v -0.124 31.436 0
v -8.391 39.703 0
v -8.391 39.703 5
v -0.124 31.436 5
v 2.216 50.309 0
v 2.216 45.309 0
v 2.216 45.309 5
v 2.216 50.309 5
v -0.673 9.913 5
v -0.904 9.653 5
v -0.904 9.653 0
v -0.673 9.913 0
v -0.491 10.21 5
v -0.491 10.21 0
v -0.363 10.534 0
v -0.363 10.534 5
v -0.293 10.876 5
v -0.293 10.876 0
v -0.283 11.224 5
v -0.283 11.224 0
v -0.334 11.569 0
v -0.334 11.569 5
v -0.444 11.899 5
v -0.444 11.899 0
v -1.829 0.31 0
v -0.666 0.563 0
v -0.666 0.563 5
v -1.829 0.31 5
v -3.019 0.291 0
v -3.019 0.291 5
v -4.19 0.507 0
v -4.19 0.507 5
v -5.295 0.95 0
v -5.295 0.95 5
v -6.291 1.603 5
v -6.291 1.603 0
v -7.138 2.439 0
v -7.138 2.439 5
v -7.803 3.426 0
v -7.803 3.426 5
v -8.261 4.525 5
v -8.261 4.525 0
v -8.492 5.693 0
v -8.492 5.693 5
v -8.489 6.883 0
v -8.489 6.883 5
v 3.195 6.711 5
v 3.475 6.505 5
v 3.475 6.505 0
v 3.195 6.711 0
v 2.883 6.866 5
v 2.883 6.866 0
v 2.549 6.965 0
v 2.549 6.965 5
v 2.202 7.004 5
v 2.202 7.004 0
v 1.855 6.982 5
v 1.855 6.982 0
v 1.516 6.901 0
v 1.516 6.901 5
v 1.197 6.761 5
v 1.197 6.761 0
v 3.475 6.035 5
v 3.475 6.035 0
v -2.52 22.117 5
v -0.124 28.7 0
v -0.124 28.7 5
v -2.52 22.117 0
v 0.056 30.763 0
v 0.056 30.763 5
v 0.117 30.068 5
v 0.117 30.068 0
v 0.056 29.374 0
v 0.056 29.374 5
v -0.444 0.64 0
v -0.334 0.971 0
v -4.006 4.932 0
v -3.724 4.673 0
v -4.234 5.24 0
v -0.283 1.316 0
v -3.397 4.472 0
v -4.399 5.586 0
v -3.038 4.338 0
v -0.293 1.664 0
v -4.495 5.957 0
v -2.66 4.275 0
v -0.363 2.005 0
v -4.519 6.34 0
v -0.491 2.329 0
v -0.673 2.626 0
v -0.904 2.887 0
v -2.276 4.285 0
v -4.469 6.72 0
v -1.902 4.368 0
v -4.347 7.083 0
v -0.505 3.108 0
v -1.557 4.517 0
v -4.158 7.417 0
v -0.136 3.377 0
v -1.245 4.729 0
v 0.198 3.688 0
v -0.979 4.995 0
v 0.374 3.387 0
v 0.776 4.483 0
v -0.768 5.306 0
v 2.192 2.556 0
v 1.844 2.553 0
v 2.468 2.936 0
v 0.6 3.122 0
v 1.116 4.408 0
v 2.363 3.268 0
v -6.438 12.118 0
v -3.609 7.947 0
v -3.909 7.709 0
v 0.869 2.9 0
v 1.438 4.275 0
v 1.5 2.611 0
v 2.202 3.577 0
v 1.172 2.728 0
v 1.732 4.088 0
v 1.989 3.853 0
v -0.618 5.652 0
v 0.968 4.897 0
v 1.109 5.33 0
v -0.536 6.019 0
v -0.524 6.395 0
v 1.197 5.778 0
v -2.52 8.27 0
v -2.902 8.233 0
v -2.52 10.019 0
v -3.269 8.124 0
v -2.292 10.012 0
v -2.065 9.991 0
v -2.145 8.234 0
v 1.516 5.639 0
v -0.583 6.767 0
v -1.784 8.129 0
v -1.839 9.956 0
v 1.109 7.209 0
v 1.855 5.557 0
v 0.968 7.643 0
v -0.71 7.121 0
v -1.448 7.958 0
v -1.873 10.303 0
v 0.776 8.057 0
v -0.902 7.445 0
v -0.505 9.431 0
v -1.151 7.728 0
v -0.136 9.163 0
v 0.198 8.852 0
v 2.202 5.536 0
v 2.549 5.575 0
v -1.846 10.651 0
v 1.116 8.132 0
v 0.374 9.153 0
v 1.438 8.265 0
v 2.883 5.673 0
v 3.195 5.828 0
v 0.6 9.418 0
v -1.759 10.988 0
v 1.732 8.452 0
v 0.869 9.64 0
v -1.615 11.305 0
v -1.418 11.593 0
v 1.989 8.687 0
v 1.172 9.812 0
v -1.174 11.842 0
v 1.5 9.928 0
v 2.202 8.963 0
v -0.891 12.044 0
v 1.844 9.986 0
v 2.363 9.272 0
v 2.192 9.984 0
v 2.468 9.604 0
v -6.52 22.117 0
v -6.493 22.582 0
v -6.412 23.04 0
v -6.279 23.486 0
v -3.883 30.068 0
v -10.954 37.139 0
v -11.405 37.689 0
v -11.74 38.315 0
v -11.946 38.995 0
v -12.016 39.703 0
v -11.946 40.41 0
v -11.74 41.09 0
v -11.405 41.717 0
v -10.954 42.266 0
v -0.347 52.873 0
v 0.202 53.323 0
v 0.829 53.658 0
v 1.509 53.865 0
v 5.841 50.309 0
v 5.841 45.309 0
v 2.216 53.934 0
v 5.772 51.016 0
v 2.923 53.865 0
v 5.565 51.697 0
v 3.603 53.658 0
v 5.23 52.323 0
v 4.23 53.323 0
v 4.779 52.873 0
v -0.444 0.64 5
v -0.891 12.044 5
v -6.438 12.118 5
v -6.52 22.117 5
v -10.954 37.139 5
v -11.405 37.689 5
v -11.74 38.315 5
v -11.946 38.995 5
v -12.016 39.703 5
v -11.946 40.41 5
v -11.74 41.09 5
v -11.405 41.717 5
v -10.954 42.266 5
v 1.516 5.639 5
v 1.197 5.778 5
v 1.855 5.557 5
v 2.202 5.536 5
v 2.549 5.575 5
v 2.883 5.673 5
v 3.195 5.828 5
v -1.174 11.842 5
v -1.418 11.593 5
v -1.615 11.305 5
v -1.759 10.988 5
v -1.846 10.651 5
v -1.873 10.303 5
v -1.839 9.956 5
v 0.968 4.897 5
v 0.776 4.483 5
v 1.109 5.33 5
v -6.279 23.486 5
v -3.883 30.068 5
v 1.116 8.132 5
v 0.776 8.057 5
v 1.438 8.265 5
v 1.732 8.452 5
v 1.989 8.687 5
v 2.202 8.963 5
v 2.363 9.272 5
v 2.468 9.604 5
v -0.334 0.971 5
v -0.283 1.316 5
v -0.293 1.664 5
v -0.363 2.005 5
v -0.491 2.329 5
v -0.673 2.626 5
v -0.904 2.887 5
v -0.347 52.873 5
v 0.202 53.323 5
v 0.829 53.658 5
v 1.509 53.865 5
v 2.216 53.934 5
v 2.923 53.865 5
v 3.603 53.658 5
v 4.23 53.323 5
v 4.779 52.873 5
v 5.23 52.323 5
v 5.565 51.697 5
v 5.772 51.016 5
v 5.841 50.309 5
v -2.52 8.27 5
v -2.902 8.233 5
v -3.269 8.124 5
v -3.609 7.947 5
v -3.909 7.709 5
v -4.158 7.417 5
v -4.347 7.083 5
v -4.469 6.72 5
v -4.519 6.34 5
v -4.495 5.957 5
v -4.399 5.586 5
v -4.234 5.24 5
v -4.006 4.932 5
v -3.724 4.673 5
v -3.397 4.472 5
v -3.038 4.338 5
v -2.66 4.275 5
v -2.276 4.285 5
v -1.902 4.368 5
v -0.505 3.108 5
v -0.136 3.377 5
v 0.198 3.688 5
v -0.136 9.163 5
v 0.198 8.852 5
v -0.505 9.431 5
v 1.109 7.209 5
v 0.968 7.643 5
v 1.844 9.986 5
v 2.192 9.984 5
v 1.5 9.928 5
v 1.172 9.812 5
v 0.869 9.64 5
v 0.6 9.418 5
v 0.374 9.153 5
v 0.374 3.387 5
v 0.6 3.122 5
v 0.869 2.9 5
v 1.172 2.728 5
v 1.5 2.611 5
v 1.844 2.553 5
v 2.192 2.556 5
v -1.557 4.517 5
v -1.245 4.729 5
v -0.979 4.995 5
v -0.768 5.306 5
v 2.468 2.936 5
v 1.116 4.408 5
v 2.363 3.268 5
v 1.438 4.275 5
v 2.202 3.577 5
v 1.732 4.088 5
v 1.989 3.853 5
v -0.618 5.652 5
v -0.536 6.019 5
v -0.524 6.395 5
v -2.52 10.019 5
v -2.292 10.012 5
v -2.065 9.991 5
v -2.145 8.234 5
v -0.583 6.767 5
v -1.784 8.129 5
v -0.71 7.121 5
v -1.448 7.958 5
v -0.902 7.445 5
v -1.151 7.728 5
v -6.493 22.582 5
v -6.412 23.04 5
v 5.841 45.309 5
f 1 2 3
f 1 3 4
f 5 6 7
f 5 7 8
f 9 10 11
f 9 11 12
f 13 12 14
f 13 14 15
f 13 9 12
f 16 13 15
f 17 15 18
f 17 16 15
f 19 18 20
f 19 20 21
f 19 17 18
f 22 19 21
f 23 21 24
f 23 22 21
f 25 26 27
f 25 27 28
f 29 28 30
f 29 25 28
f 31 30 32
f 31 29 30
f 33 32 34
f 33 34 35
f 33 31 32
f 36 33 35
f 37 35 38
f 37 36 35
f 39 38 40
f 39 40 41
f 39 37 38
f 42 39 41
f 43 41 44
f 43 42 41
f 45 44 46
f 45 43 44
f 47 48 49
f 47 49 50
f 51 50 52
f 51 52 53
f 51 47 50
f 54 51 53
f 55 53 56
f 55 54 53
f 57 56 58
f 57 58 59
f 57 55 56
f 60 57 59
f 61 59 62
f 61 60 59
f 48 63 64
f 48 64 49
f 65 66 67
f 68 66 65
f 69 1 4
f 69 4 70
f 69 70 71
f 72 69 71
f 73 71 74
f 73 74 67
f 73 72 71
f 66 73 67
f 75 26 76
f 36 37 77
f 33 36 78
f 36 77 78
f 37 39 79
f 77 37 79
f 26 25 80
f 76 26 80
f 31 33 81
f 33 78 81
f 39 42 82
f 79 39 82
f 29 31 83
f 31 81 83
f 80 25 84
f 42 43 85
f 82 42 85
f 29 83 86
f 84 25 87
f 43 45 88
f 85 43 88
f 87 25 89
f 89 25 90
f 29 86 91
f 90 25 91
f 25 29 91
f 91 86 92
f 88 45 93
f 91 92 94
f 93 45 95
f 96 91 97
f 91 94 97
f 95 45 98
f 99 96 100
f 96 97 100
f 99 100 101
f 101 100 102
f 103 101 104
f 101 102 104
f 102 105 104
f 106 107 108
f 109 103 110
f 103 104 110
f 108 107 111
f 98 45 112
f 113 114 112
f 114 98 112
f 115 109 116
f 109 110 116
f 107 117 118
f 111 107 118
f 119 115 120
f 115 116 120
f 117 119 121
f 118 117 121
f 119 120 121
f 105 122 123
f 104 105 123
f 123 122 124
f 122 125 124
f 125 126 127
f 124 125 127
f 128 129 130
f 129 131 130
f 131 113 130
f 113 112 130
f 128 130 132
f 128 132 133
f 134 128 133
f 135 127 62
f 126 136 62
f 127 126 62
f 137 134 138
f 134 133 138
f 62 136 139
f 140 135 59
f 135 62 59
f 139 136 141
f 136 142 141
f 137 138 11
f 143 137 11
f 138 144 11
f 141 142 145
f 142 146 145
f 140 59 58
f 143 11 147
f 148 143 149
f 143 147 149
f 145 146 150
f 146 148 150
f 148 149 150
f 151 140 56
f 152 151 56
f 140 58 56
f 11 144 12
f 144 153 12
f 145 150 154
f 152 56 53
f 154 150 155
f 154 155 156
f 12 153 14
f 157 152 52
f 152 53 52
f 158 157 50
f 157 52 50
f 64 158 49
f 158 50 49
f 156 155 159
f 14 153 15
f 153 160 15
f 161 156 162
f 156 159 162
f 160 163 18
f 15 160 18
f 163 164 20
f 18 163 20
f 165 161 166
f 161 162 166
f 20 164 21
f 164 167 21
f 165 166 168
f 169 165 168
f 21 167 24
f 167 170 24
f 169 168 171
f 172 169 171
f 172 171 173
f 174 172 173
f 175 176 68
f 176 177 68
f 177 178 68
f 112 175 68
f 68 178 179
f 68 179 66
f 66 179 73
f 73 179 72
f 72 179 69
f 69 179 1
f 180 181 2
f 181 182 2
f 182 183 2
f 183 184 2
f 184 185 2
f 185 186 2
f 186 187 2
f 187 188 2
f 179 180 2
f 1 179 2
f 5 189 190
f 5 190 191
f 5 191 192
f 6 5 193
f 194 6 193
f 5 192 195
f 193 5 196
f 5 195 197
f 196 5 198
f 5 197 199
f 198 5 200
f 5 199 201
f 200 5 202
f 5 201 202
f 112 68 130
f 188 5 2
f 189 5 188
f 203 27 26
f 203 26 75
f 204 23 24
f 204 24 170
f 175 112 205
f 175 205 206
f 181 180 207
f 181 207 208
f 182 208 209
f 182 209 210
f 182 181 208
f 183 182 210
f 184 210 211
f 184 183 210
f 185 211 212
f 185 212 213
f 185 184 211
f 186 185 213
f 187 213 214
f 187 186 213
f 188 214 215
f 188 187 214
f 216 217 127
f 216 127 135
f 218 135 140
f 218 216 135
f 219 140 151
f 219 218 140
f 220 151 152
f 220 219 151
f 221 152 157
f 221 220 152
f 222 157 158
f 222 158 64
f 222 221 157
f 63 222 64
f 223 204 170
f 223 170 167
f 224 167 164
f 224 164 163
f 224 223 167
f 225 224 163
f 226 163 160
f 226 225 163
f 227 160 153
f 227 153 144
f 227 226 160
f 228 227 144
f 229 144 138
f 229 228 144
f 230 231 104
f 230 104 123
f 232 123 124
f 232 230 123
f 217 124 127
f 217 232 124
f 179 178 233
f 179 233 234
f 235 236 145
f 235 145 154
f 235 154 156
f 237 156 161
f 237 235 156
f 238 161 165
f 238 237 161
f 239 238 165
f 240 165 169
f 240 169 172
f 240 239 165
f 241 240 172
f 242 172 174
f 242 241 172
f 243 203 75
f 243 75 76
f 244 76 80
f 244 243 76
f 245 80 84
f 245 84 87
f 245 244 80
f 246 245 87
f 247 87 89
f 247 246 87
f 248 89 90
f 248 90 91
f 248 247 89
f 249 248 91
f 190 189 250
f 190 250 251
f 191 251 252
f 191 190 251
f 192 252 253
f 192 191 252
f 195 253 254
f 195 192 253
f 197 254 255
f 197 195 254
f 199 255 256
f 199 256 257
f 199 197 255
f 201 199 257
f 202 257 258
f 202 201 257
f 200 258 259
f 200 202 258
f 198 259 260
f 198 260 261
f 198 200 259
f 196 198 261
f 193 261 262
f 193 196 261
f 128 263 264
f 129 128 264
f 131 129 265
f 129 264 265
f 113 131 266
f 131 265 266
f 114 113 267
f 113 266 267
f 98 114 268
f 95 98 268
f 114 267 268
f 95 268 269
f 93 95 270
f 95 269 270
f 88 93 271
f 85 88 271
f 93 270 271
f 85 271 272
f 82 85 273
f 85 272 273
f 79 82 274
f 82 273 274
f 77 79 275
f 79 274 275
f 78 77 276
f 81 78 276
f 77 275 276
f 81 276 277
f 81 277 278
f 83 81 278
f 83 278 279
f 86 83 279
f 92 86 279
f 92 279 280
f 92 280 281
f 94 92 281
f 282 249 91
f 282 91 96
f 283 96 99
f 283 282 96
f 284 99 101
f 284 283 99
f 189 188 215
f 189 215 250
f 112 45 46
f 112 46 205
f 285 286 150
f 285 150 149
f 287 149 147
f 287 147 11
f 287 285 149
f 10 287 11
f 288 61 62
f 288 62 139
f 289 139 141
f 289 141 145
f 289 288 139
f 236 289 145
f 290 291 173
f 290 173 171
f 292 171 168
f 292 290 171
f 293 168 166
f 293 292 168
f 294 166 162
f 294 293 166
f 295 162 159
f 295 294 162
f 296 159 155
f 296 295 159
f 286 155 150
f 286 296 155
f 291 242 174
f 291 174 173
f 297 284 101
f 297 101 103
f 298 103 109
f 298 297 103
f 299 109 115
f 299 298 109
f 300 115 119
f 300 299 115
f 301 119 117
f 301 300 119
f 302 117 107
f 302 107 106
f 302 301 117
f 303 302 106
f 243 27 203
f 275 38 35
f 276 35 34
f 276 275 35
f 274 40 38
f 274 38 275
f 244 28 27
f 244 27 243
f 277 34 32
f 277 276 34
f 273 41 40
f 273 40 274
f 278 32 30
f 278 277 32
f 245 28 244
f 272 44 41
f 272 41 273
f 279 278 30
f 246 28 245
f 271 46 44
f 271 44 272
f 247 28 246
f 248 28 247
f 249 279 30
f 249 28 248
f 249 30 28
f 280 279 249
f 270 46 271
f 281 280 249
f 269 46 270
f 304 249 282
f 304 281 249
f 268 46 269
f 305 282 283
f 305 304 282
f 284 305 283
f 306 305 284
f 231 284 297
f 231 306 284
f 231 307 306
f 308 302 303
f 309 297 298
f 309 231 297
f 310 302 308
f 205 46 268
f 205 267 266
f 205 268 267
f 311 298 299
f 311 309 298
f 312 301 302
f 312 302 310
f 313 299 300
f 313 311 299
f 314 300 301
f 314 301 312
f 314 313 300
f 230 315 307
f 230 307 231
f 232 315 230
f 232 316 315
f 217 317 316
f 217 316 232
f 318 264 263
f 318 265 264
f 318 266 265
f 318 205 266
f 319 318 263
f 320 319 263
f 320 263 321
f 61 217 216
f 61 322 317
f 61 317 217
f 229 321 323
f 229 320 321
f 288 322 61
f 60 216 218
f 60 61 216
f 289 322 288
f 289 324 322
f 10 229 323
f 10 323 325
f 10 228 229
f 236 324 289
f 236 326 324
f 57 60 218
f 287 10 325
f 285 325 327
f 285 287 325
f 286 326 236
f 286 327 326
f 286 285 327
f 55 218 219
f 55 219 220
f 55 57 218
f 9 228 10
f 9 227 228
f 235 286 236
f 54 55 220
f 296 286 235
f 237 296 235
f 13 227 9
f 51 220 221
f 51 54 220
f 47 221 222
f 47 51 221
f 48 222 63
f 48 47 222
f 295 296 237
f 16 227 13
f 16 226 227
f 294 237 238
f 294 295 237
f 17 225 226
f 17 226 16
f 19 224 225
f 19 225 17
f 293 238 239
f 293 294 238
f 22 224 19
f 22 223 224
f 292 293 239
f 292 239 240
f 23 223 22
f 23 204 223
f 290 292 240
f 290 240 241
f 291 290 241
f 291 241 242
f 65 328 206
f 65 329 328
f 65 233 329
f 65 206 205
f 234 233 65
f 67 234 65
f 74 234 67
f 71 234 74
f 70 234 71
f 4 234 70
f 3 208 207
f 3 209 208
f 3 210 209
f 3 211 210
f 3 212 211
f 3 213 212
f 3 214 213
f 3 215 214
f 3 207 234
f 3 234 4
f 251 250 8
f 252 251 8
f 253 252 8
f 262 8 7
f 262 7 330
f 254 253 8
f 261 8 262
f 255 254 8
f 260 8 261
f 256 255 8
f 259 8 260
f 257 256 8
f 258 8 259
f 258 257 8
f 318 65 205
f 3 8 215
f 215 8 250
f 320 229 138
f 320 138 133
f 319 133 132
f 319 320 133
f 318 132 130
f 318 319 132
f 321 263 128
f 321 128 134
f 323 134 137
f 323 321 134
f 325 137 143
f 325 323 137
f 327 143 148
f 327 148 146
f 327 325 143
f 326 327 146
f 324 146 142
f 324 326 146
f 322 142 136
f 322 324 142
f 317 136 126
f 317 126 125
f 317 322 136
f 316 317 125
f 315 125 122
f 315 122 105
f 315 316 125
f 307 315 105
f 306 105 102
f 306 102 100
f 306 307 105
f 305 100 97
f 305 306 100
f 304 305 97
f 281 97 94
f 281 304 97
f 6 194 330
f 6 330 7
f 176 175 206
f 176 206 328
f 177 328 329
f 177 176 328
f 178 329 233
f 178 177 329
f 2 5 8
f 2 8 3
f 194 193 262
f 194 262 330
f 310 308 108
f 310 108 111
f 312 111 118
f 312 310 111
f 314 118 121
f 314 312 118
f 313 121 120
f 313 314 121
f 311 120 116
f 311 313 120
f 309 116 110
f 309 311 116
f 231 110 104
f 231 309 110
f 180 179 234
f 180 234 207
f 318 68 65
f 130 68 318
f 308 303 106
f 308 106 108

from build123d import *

# Parameters (mm, degrees)
BOSS_EXTRUDE1_DEPTH = 5
BOSS_EXTRUDE2_DEPTH = 5
CUT_EXTRUDE1_REACH  = 7
SKETCH3_R           = 2


with BuildPart() as part:
    # Sketch1 → Boss-Extrude1 (new body)
    with BuildSketch(Plane.XY):
        with BuildLine():
            Line((-2.520114714, 12.117440709), (-2.520114714, 6.269831909))
            Line((-2.520114714, 6.269831909), (-0.666012747, 0.563492811))
            ThreePointArc((-0.666012747, 0.563492811), (-6.290753591, 1.602682623), (-8.48865141, 6.883484665))
            Line((-8.48865141, 6.883484665), (-6.437898745, 12.117778688))
            Line((-6.437898745, 12.117778688), (-6.520114714, 22.117440709))
            ThreePointArc((-6.520114714, 22.117440709), (-6.459345726, 22.81203342), (-6.278885197, 23.485521282))
            Line((-6.278885197, 23.485521282), (-3.883018647, 30.068110528))
            Line((-3.883018647, 30.068110528), (-10.954086459, 37.13917834))
            ThreePointArc((-10.954086459, 37.13917834), (-12.015892078, 39.702603869), (-10.954086459, 42.266029397))
            Line((-10.954086459, 42.266029397), (-0.347484741, 52.872631115))
            ThreePointArc((-0.347484741, 52.872631115), (3.603256686, 53.658482445), (5.841171936, 50.309205586))
            Line((5.841171936, 50.309205586), (5.841171936, 45.309205586))
            Line((5.841171936, 45.309205586), (2.215940787, 45.309205586))
            Line((2.215940787, 45.309205586), (2.215940787, 50.309205586))
            Line((2.215940787, 50.309205586), (-8.39066093, 39.702603869))
            Line((-8.39066093, 39.702603869), (-0.124248164, 31.436191102))
            ThreePointArc((-0.124248164, 31.436191102), (0.116981353, 30.068110528), (-0.124248164, 28.700029955))
            Line((-0.124248164, 28.700029955), (-2.520114714, 22.117440709))
            Line((-2.520114714, 22.117440709), (-2.520114714, 12.117440709))
        make_face()
    extrude(amount=BOSS_EXTRUDE1_DEPTH)

    # Sketch2 → Boss-Extrude2 (add)
    with BuildSketch(Plane.XY.offset(5)):
        with BuildLine():
            Line((-0.666012747, 0.563492811), (-0.444155406, 0.640409829))
            ThreePointArc((-0.444155406, 0.640409829), (-0.320137366, 1.836179716), (-0.904060997, 2.887026655))
            ThreePointArc((-0.904060997, 2.887026655), (-0.316507803, 3.236827197), (0.197736204, 3.687529179))
            ThreePointArc((0.197736204, 3.687529179), (1.016708708, 2.807455242), (2.192277133, 2.55589019))
            Line((2.192277133, 2.55589019), (2.468262924, 2.935752043))
            ThreePointArc((2.468262924, 2.935752043), (1.865739721, 3.976046178), (0.775663247, 4.482977511))
            ThreePointArc((0.775663247, 4.482977511), (1.045396166, 5.111327197), (1.196512329, 5.778217803))
            ThreePointArc((1.196512329, 5.778217803), (2.376369483, 5.547602991), (3.475290544, 6.035064372))
            Line((3.475290544, 6.035064372), (3.475290544, 6.504599445))
            ThreePointArc((3.475290544, 6.504599445), (2.376369483, 6.992060826), (1.196512329, 6.761446014))
            ThreePointArc((1.196512329, 6.761446014), (1.045396166, 7.428336621), (0.775663247, 8.056686306))
            ThreePointArc((0.775663247, 8.056686306), (1.865739721, 8.56361764), (2.468262924, 9.603911774))
            Line((2.468262924, 9.603911774), (2.192277133, 9.983773627))
            ThreePointArc((2.192277133, 9.983773627), (1.016708708, 9.732208576), (0.197736204, 8.852134639))
            ThreePointArc((0.197736204, 8.852134639), (-0.316507803, 9.302836621), (-0.904060997, 9.652637162))
            ThreePointArc((-0.904060997, 9.652637162), (-0.320137366, 10.703484102), (-0.444155406, 11.899253988))
            Line((-0.444155406, 11.899253988), (-0.890709796, 12.044348305))
            ThreePointArc((-0.890709796, 12.044348305), (-1.693898402, 11.14984612), (-1.839166595, 9.956471389))
            ThreePointArc((-1.839166595, 9.956471389), (-2.178215907, 10.003209228), (-2.520114714, 10.018831909))
            Line((-2.520114714, 10.018831909), (-2.520114714, 8.269831909))
            ThreePointArc((-2.520114714, 8.269831909), (-0.544738032, 6.582700839), (-1.902080725, 4.367718876))
            Line((-1.902080725, 4.367718876), (-0.666012747, 0.563492811))
        make_face()
    extrude(amount=-BOSS_EXTRUDE2_DEPTH)

    # Sketch3 → Cut-Extrude1 (cut, up to next)
    with BuildSketch(Plane.XY.offset(5), mode=Mode.PRIVATE) as cut_extrude1_sk1:
        with Locations((-2.520114714, 6.269831909)):
            Circle(SKETCH3_R)
    cut_extrude1_tool1 = extrude(cut_extrude1_sk1.sketch, amount=-CUT_EXTRUDE1_REACH, mode=Mode.PRIVATE) & part.part
    add(cut_extrude1_tool1.solids().sort_by_distance((-2.520115, 6.269832, 5))[0], mode=Mode.SUBTRACT)


solid = part.part
